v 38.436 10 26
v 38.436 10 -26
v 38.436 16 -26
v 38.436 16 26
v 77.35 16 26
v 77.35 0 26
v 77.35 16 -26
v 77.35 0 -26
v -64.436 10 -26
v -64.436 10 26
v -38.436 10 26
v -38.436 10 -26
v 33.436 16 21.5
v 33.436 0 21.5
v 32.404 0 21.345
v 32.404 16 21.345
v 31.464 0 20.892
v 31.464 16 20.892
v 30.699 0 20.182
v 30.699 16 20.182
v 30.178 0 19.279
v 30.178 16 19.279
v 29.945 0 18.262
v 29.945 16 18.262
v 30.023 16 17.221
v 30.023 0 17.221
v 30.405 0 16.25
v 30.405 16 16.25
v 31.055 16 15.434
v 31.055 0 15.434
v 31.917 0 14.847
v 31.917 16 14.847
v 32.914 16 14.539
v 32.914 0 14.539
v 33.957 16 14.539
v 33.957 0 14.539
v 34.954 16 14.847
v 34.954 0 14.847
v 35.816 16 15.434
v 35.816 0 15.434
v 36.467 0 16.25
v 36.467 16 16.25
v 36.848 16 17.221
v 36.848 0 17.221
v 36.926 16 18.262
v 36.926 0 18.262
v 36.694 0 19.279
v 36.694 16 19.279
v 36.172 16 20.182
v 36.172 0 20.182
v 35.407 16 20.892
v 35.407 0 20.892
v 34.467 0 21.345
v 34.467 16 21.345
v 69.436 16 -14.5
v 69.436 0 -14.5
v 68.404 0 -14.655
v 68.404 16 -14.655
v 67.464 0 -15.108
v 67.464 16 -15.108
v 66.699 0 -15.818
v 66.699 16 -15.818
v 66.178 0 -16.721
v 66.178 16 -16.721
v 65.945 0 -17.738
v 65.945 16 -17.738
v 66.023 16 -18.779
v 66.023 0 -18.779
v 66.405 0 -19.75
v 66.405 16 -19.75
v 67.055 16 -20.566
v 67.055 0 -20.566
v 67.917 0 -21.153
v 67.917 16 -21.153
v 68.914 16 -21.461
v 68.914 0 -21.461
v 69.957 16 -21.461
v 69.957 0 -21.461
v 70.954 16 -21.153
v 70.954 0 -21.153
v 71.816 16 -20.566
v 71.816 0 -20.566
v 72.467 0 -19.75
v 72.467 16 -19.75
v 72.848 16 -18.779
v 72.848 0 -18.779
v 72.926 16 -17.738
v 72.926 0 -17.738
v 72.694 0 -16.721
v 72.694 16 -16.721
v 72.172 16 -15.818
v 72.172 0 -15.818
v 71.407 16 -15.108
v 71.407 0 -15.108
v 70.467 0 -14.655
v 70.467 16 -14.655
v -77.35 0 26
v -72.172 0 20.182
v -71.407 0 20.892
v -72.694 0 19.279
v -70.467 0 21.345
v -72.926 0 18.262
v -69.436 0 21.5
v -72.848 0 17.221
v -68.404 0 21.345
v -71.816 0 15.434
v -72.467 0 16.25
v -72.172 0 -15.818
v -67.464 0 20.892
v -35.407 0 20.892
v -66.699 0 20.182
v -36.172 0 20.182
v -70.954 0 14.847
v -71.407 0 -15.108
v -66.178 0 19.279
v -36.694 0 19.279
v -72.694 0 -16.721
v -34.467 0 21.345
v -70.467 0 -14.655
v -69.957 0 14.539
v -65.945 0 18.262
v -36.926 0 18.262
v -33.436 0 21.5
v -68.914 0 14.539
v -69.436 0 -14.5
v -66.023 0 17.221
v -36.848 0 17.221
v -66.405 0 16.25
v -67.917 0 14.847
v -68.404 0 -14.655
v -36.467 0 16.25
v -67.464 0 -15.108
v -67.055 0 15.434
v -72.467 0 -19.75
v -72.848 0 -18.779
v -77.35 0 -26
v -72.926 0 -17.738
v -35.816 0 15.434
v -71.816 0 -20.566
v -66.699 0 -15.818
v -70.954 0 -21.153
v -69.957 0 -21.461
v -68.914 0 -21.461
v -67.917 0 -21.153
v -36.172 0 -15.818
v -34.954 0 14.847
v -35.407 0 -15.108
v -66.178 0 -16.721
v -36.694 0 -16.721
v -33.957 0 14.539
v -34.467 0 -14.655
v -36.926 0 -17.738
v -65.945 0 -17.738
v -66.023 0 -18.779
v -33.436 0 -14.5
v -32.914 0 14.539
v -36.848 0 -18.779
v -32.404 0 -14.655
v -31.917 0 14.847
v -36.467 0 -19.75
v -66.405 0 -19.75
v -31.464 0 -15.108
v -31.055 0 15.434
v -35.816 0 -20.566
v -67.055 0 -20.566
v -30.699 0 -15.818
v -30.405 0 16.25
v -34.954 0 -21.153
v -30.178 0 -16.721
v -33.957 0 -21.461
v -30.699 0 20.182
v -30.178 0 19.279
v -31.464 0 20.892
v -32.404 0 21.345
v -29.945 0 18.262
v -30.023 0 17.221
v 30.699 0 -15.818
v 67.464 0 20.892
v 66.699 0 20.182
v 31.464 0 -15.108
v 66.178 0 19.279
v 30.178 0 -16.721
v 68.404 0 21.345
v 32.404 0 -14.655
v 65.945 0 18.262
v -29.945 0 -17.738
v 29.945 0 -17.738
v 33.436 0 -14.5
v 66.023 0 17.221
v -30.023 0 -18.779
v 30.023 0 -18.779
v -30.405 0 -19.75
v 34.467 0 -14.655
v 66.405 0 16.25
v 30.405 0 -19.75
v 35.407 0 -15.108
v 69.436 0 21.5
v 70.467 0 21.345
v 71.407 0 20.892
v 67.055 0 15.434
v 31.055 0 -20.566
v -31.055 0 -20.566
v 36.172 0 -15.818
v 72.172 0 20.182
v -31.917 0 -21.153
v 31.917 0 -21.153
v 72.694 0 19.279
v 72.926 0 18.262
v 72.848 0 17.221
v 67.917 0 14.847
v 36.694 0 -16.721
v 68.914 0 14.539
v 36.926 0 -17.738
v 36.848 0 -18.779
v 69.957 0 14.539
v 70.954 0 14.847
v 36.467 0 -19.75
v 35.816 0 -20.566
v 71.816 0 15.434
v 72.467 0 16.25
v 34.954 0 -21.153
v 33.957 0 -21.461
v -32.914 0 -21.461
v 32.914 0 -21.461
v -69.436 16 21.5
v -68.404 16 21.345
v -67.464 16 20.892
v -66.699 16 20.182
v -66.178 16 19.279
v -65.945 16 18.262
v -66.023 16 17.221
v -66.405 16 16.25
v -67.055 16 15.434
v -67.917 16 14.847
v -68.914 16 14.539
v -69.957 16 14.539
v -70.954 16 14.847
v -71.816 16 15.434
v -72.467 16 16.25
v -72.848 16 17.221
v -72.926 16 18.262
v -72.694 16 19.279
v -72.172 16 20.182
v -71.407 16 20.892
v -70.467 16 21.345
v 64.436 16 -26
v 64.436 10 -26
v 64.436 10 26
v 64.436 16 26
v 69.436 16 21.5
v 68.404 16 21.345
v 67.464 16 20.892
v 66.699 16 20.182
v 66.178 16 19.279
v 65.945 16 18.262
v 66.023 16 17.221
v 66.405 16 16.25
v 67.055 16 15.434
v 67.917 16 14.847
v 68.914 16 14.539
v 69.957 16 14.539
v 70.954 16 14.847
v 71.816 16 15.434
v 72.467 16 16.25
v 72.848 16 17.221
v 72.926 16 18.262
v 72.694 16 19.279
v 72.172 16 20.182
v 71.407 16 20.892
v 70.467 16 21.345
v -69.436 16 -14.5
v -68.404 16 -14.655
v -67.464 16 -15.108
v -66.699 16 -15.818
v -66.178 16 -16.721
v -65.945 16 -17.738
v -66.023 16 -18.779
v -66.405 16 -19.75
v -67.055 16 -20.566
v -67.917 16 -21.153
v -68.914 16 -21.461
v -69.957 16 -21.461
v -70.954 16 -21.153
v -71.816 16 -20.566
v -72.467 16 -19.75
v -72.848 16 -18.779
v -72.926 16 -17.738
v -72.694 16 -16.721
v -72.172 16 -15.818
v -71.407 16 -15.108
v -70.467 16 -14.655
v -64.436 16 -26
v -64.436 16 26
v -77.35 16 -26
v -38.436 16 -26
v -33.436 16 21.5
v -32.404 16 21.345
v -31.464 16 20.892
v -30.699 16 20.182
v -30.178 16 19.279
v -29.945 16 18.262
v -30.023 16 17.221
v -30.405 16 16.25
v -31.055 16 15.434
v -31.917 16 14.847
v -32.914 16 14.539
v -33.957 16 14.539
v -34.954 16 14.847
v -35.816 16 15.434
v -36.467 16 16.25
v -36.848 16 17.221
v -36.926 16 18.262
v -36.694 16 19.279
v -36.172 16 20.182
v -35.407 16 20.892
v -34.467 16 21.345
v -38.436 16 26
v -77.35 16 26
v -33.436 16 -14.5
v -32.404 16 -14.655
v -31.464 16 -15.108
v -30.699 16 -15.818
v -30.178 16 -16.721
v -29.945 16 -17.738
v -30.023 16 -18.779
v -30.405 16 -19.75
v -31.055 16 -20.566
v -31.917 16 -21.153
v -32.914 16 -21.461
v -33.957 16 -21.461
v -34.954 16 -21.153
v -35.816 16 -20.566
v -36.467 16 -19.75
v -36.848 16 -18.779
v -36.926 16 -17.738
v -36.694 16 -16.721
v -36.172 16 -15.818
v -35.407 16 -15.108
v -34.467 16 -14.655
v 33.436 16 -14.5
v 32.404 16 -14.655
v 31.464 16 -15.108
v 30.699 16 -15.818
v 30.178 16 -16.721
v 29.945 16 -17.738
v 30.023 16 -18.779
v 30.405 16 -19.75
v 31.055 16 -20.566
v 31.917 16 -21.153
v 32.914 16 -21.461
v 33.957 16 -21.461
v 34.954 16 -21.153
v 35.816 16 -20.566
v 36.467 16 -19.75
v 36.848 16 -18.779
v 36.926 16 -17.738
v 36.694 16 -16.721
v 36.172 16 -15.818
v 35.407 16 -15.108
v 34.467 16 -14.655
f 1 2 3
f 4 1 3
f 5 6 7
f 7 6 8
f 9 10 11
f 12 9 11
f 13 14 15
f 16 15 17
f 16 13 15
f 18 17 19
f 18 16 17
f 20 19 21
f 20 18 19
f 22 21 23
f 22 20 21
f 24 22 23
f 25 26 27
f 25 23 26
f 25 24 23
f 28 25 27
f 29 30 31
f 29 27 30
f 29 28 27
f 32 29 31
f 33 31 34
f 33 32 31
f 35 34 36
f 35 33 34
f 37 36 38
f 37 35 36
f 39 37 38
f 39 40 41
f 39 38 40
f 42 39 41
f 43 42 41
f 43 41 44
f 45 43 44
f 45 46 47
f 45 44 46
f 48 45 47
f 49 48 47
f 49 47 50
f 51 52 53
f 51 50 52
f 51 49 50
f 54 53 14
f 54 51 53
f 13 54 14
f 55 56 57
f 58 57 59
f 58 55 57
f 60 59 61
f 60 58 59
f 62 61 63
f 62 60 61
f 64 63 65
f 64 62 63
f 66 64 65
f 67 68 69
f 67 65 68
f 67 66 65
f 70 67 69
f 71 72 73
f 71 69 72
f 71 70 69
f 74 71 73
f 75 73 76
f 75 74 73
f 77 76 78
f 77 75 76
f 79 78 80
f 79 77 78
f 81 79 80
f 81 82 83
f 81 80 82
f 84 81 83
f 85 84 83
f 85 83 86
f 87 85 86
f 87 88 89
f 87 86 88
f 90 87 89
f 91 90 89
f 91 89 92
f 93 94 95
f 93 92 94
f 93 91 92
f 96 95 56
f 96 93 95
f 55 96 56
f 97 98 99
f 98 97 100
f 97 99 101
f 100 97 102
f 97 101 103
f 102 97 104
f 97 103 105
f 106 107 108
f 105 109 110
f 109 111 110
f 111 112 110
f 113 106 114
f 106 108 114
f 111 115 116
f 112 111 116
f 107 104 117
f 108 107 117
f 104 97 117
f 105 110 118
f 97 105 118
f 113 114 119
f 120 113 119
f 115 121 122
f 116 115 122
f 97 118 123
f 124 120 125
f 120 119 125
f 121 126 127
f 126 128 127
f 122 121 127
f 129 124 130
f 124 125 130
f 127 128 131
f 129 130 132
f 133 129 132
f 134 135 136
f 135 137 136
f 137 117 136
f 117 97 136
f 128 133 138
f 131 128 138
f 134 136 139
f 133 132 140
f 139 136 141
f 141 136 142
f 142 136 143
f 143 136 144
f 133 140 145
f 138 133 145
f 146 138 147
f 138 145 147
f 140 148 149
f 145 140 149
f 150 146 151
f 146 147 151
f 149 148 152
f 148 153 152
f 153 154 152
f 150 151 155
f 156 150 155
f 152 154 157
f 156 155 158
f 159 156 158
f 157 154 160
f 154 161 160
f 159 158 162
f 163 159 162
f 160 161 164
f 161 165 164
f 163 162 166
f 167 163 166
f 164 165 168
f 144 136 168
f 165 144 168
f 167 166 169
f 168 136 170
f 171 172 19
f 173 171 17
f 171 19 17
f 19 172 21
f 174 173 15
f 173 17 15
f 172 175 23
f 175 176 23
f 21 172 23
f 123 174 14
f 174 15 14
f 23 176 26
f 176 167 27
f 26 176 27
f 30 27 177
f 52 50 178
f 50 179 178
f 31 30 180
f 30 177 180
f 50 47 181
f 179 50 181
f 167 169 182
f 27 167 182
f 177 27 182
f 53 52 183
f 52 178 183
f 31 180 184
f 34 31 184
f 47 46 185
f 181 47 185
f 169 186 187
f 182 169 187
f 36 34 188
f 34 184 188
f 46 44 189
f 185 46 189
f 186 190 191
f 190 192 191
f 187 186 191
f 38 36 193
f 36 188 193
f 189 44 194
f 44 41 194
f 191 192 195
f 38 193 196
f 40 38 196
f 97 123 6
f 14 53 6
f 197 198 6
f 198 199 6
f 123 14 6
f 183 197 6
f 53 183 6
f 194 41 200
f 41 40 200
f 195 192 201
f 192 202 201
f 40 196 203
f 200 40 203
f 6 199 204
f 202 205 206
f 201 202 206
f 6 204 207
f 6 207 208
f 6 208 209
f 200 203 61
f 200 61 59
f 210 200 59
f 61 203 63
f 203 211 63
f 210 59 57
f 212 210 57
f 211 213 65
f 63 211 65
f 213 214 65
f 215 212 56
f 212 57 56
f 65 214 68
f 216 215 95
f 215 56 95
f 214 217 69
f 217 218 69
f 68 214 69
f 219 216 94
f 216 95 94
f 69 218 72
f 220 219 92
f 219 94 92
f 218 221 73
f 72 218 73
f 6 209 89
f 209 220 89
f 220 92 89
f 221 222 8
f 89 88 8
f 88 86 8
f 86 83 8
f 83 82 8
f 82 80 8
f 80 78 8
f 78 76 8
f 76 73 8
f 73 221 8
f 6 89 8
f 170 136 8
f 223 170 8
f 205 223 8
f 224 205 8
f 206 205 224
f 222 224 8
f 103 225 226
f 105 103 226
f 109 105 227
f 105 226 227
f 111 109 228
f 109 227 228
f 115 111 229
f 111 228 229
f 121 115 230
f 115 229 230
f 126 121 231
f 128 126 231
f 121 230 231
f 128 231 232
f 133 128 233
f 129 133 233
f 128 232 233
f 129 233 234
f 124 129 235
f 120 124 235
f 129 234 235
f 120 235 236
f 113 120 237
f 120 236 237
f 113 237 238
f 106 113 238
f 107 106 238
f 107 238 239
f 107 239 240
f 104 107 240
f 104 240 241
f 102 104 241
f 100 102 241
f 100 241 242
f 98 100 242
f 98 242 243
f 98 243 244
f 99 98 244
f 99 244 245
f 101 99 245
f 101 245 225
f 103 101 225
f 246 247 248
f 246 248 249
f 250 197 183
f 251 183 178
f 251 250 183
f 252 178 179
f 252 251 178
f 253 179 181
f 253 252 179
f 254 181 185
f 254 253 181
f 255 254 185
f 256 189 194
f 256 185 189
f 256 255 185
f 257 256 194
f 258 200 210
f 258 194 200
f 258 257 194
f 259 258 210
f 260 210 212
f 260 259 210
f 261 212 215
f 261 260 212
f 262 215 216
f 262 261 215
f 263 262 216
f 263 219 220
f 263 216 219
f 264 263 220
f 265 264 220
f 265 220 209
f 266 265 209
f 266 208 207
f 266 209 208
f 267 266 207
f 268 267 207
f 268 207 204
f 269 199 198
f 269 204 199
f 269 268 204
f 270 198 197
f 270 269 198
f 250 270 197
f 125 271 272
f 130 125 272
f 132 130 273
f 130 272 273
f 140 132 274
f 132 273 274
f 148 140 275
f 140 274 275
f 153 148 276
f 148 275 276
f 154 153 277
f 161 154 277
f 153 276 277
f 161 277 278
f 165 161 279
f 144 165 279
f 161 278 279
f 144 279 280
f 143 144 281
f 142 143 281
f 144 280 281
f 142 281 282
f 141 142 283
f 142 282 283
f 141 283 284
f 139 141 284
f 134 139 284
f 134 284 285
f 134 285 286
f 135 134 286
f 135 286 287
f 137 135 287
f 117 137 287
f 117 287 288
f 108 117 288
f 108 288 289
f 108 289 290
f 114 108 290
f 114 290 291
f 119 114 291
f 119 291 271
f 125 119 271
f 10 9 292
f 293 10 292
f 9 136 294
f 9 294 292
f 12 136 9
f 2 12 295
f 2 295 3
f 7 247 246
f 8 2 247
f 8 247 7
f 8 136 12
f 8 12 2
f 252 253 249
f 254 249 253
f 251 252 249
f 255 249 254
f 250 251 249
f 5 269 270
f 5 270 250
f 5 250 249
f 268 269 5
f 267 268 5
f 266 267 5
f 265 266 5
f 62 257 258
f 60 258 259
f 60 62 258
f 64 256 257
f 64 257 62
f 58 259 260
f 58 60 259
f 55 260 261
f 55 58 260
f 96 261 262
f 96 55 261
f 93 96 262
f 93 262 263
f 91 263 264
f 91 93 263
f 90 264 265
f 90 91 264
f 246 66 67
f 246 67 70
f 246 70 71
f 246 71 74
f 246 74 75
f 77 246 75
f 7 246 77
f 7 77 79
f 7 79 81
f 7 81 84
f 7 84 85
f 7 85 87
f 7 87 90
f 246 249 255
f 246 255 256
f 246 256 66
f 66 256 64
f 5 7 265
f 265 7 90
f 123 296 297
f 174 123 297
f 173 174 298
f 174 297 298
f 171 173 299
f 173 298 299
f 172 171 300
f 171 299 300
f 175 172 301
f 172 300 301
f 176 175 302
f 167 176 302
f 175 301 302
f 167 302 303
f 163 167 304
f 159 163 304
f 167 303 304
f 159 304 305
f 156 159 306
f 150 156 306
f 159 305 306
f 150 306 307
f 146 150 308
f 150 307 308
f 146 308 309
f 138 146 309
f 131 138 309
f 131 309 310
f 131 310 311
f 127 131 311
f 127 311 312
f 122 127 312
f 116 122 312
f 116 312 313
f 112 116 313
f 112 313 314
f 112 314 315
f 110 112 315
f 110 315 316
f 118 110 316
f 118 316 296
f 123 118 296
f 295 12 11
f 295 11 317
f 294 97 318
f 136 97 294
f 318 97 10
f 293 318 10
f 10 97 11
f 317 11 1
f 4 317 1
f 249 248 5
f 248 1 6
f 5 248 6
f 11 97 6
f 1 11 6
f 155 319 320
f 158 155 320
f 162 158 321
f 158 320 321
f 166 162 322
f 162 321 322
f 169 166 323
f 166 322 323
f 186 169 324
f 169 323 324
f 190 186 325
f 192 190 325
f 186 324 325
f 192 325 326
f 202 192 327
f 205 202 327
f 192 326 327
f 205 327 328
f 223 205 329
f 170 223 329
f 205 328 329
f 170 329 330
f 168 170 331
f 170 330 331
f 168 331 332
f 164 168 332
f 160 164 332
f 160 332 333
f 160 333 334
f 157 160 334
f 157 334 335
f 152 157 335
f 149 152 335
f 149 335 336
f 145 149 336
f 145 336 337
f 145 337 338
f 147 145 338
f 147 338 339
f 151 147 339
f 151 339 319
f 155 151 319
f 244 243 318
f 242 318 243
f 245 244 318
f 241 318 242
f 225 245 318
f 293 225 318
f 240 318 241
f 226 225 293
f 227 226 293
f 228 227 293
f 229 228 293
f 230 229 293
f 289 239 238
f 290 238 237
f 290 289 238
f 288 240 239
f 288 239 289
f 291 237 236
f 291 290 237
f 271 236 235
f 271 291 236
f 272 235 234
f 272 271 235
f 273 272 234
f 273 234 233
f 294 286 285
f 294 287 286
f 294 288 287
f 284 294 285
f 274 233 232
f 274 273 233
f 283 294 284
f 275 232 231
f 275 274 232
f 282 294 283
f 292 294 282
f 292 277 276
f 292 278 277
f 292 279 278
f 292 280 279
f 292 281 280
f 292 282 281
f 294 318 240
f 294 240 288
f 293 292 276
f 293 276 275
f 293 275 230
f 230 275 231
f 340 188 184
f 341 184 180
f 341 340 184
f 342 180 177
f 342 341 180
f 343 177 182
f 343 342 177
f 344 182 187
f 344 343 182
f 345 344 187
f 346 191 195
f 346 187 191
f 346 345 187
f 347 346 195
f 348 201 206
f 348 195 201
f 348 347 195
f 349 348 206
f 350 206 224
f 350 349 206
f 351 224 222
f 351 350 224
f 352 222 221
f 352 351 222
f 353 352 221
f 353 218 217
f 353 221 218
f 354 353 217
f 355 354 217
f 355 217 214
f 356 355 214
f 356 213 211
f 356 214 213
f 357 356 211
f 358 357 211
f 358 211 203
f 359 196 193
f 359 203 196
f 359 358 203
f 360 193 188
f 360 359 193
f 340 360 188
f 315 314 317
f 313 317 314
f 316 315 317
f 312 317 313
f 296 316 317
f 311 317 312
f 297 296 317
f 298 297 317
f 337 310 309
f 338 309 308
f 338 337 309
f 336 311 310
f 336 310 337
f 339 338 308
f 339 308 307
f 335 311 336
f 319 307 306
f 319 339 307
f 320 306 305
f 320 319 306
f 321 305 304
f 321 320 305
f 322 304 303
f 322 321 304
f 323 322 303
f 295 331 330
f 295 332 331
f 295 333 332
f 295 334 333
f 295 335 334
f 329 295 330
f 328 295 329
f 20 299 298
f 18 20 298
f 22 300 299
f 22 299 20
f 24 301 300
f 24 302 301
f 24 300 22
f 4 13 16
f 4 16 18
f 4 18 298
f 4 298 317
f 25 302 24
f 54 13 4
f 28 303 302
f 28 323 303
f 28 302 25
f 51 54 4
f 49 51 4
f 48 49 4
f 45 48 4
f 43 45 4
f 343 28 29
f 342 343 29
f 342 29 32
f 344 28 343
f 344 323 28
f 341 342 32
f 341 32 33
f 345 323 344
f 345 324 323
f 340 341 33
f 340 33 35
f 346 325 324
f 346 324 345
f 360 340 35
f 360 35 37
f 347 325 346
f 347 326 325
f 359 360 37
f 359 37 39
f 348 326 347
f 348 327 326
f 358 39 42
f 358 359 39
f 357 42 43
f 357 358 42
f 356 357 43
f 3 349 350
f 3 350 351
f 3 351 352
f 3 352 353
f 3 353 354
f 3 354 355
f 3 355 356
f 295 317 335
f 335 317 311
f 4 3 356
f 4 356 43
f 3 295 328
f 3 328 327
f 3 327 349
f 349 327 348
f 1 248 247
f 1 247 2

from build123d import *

# Parameters (mm, degrees)
SKETCH1_W           = 154.7
SKETCH1_H           = 52
BOSS_EXTRUDE1_DEPTH = 16
SKETCH3_R           = 3.5
CUT_EXTRUDE2_DEPTH  = 84.156614289
SKETCH5_W           = 26
SKETCH5_H           = 6
CUT_EXTRUDE4_DEPTH  = 95.567555218


with BuildPart() as part:
    # Sketch1 → Boss-Extrude1 (new body)
    with BuildSketch(Plane(origin=(0, 0, 0), x_dir=(1, 0, 0), z_dir=(0, 1, 0))):
        Rectangle(SKETCH1_W, SKETCH1_H)
    extrude(amount=BOSS_EXTRUDE1_DEPTH)

    # Sketch3 → Cut-Extrude2 (cut, through all)
    with BuildSketch(Plane(origin=(0, 16, 0), x_dir=(1, 0, 0), z_dir=(0, 1, 0))):
        with Locations(Location((-69.435638509, 18, 0), (0, 0, 270))):
            Circle(SKETCH3_R)
        with Locations(Location((-33.435638509, 18, 0), (0, 0, 270))):
            Circle(SKETCH3_R)
        with Locations(Location((-33.435638509, -18, 0), (0, 0, 270))):
            Circle(SKETCH3_R)
        with Locations(Location((-69.435638509, -18, 0), (0, 0, 270))):
            Circle(SKETCH3_R)
    cut_extrude2 = extrude(amount=-CUT_EXTRUDE2_DEPTH, mode=Mode.SUBTRACT)

    # Mirror1: Cut-Extrude2 across plane
    add(cut_extrude2.mirror(Plane.ZY), mode=Mode.SUBTRACT)

    # Sketch5 → Cut-Extrude4 (cut, through all)
    with BuildSketch(Plane.XY.offset(26)):
        with Locations((-51.435638509, 13)):
            Rectangle(SKETCH5_W, SKETCH5_H)
    cut_extrude4 = extrude(amount=-CUT_EXTRUDE4_DEPTH, mode=Mode.SUBTRACT)

    # Mirror2: Cut-Extrude4 across plane
    add(cut_extrude4.mirror(Plane.ZY), mode=Mode.SUBTRACT)


solid = part.part
